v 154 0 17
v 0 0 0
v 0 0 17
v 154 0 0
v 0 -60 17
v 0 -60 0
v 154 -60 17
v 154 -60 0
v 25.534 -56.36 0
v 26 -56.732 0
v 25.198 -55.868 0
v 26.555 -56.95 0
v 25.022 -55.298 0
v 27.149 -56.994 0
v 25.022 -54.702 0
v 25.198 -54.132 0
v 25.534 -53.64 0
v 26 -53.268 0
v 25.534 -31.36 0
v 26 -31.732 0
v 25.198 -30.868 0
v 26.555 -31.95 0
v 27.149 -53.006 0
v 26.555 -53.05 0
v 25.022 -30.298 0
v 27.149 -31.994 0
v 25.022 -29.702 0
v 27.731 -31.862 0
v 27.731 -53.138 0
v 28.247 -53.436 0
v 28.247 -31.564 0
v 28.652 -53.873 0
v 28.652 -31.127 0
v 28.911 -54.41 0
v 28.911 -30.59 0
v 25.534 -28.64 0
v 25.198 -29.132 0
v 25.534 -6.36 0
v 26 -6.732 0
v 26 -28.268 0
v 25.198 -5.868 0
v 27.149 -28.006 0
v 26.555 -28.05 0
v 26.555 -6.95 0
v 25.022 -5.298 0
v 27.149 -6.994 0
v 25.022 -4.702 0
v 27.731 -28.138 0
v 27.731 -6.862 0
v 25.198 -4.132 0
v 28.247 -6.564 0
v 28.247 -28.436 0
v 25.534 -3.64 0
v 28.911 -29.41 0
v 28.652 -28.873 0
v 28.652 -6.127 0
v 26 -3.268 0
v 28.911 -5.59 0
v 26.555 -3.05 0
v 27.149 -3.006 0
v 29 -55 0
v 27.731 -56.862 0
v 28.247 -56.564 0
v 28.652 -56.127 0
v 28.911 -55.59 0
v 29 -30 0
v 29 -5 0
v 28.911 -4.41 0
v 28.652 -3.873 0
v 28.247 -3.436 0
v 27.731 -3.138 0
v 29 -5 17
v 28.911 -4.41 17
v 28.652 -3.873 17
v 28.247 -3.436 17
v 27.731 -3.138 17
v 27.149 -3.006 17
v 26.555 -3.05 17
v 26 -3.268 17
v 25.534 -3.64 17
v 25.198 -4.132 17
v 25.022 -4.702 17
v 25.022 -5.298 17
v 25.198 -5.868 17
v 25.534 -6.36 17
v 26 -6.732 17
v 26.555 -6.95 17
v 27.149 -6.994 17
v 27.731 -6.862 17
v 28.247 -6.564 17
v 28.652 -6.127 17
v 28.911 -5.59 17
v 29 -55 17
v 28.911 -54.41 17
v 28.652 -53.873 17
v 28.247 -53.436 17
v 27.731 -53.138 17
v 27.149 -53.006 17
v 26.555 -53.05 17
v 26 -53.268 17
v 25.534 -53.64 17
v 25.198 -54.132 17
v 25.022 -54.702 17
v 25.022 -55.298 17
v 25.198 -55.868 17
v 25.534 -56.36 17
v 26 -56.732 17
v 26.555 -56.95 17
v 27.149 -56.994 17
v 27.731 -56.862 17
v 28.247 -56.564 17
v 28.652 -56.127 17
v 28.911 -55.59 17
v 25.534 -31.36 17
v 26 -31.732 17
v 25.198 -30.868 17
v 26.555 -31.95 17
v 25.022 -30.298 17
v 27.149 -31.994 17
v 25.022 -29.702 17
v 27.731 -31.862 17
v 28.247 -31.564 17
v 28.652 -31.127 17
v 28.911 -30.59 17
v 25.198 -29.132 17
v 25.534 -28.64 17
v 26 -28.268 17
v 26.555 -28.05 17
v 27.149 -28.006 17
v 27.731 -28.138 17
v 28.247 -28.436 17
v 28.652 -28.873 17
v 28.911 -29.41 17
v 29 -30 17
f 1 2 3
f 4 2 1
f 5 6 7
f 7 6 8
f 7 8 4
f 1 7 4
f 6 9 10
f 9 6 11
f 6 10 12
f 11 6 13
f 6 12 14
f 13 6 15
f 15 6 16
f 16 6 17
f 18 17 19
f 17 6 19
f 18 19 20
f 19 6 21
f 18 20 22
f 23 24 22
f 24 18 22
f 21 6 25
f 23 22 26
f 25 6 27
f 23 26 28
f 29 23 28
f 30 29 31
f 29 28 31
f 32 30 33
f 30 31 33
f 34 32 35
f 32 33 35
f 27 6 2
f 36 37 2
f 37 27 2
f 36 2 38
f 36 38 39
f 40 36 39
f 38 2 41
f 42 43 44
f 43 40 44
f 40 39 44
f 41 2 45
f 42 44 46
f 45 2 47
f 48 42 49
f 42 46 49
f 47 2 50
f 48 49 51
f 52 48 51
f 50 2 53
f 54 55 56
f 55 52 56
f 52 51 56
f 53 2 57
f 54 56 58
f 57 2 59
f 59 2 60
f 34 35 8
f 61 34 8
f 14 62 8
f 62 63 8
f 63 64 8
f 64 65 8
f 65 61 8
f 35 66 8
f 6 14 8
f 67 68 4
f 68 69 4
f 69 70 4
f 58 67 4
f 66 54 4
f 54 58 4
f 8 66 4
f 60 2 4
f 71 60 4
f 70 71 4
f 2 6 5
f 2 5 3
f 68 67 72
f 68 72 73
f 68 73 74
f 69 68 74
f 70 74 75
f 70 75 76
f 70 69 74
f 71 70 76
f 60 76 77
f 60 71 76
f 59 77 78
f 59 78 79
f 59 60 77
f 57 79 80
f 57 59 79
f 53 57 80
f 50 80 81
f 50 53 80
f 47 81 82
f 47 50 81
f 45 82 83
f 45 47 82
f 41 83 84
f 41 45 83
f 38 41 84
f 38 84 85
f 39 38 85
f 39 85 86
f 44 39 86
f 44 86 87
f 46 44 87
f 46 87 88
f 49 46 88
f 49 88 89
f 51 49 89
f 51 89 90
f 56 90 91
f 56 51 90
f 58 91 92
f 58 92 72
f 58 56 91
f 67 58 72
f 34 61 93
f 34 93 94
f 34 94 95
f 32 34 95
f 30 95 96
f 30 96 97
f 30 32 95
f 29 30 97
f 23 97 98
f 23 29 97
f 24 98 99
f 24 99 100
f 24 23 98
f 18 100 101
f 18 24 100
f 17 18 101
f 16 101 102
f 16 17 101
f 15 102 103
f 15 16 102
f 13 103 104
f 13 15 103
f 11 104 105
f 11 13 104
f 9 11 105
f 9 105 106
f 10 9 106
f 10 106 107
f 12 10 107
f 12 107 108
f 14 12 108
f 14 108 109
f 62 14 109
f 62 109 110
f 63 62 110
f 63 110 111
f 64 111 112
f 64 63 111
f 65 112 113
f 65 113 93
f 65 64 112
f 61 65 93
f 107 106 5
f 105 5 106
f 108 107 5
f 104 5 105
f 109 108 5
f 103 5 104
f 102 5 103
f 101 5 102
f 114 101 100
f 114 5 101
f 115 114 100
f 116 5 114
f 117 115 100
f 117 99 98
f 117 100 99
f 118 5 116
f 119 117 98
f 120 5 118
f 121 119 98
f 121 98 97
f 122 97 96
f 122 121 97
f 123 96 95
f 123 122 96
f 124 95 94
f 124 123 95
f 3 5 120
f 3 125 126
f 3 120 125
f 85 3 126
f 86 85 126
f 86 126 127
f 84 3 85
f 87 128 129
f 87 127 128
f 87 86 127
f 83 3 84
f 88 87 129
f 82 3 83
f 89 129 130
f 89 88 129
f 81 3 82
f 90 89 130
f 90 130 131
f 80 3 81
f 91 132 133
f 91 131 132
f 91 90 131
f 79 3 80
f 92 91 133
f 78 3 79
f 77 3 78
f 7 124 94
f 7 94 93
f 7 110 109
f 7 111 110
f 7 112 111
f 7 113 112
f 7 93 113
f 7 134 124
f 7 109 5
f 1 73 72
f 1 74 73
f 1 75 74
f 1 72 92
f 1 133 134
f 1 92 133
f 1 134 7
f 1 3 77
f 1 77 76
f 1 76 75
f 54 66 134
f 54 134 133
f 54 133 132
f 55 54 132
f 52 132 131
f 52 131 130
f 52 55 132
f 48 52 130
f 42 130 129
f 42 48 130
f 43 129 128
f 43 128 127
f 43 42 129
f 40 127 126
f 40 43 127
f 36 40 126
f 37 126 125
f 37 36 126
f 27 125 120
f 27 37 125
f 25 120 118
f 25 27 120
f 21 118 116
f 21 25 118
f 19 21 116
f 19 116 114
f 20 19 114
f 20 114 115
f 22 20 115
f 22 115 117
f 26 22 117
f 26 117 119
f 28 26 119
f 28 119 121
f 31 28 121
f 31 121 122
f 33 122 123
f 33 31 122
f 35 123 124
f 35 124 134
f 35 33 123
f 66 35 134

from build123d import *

# Parameters (mm, degrees)
ESQUISSE1_W        = 54
ESQUISSE1_H        = 60
ESQUISSE1_R        = 2
ESQUISSE1_W_2      = 46
BOSS_EXTRU_1_DEPTH = 17


with BuildPart() as part:
    # Esquisse1 → Boss.-Extru.1 (new body)
    # profile 1 of 3: a face of its own
    with BuildSketch(Plane.XY):
        with Locations((27, -30)):
            Rectangle(ESQUISSE1_W, ESQUISSE1_H)
        with Locations((27, -5)):
            Circle(ESQUISSE1_R, mode=Mode.SUBTRACT)
        with Locations((27, -30)):
            Circle(ESQUISSE1_R, mode=Mode.SUBTRACT)
        with Locations((27, -55)):
            Circle(ESQUISSE1_R, mode=Mode.SUBTRACT)
    # profile 2 of 3: a face of its own
    with BuildSketch(Plane.XY):
        with Locations((77, -30)):
            Rectangle(ESQUISSE1_W_2, ESQUISSE1_H)
    # profile 3 of 3: a face of its own
    with BuildSketch(Plane.XY):
        with Locations((127, -30)):
            Rectangle(ESQUISSE1_W, ESQUISSE1_H)
    extrude(amount=BOSS_EXTRU_1_DEPTH)


solid = part.part
